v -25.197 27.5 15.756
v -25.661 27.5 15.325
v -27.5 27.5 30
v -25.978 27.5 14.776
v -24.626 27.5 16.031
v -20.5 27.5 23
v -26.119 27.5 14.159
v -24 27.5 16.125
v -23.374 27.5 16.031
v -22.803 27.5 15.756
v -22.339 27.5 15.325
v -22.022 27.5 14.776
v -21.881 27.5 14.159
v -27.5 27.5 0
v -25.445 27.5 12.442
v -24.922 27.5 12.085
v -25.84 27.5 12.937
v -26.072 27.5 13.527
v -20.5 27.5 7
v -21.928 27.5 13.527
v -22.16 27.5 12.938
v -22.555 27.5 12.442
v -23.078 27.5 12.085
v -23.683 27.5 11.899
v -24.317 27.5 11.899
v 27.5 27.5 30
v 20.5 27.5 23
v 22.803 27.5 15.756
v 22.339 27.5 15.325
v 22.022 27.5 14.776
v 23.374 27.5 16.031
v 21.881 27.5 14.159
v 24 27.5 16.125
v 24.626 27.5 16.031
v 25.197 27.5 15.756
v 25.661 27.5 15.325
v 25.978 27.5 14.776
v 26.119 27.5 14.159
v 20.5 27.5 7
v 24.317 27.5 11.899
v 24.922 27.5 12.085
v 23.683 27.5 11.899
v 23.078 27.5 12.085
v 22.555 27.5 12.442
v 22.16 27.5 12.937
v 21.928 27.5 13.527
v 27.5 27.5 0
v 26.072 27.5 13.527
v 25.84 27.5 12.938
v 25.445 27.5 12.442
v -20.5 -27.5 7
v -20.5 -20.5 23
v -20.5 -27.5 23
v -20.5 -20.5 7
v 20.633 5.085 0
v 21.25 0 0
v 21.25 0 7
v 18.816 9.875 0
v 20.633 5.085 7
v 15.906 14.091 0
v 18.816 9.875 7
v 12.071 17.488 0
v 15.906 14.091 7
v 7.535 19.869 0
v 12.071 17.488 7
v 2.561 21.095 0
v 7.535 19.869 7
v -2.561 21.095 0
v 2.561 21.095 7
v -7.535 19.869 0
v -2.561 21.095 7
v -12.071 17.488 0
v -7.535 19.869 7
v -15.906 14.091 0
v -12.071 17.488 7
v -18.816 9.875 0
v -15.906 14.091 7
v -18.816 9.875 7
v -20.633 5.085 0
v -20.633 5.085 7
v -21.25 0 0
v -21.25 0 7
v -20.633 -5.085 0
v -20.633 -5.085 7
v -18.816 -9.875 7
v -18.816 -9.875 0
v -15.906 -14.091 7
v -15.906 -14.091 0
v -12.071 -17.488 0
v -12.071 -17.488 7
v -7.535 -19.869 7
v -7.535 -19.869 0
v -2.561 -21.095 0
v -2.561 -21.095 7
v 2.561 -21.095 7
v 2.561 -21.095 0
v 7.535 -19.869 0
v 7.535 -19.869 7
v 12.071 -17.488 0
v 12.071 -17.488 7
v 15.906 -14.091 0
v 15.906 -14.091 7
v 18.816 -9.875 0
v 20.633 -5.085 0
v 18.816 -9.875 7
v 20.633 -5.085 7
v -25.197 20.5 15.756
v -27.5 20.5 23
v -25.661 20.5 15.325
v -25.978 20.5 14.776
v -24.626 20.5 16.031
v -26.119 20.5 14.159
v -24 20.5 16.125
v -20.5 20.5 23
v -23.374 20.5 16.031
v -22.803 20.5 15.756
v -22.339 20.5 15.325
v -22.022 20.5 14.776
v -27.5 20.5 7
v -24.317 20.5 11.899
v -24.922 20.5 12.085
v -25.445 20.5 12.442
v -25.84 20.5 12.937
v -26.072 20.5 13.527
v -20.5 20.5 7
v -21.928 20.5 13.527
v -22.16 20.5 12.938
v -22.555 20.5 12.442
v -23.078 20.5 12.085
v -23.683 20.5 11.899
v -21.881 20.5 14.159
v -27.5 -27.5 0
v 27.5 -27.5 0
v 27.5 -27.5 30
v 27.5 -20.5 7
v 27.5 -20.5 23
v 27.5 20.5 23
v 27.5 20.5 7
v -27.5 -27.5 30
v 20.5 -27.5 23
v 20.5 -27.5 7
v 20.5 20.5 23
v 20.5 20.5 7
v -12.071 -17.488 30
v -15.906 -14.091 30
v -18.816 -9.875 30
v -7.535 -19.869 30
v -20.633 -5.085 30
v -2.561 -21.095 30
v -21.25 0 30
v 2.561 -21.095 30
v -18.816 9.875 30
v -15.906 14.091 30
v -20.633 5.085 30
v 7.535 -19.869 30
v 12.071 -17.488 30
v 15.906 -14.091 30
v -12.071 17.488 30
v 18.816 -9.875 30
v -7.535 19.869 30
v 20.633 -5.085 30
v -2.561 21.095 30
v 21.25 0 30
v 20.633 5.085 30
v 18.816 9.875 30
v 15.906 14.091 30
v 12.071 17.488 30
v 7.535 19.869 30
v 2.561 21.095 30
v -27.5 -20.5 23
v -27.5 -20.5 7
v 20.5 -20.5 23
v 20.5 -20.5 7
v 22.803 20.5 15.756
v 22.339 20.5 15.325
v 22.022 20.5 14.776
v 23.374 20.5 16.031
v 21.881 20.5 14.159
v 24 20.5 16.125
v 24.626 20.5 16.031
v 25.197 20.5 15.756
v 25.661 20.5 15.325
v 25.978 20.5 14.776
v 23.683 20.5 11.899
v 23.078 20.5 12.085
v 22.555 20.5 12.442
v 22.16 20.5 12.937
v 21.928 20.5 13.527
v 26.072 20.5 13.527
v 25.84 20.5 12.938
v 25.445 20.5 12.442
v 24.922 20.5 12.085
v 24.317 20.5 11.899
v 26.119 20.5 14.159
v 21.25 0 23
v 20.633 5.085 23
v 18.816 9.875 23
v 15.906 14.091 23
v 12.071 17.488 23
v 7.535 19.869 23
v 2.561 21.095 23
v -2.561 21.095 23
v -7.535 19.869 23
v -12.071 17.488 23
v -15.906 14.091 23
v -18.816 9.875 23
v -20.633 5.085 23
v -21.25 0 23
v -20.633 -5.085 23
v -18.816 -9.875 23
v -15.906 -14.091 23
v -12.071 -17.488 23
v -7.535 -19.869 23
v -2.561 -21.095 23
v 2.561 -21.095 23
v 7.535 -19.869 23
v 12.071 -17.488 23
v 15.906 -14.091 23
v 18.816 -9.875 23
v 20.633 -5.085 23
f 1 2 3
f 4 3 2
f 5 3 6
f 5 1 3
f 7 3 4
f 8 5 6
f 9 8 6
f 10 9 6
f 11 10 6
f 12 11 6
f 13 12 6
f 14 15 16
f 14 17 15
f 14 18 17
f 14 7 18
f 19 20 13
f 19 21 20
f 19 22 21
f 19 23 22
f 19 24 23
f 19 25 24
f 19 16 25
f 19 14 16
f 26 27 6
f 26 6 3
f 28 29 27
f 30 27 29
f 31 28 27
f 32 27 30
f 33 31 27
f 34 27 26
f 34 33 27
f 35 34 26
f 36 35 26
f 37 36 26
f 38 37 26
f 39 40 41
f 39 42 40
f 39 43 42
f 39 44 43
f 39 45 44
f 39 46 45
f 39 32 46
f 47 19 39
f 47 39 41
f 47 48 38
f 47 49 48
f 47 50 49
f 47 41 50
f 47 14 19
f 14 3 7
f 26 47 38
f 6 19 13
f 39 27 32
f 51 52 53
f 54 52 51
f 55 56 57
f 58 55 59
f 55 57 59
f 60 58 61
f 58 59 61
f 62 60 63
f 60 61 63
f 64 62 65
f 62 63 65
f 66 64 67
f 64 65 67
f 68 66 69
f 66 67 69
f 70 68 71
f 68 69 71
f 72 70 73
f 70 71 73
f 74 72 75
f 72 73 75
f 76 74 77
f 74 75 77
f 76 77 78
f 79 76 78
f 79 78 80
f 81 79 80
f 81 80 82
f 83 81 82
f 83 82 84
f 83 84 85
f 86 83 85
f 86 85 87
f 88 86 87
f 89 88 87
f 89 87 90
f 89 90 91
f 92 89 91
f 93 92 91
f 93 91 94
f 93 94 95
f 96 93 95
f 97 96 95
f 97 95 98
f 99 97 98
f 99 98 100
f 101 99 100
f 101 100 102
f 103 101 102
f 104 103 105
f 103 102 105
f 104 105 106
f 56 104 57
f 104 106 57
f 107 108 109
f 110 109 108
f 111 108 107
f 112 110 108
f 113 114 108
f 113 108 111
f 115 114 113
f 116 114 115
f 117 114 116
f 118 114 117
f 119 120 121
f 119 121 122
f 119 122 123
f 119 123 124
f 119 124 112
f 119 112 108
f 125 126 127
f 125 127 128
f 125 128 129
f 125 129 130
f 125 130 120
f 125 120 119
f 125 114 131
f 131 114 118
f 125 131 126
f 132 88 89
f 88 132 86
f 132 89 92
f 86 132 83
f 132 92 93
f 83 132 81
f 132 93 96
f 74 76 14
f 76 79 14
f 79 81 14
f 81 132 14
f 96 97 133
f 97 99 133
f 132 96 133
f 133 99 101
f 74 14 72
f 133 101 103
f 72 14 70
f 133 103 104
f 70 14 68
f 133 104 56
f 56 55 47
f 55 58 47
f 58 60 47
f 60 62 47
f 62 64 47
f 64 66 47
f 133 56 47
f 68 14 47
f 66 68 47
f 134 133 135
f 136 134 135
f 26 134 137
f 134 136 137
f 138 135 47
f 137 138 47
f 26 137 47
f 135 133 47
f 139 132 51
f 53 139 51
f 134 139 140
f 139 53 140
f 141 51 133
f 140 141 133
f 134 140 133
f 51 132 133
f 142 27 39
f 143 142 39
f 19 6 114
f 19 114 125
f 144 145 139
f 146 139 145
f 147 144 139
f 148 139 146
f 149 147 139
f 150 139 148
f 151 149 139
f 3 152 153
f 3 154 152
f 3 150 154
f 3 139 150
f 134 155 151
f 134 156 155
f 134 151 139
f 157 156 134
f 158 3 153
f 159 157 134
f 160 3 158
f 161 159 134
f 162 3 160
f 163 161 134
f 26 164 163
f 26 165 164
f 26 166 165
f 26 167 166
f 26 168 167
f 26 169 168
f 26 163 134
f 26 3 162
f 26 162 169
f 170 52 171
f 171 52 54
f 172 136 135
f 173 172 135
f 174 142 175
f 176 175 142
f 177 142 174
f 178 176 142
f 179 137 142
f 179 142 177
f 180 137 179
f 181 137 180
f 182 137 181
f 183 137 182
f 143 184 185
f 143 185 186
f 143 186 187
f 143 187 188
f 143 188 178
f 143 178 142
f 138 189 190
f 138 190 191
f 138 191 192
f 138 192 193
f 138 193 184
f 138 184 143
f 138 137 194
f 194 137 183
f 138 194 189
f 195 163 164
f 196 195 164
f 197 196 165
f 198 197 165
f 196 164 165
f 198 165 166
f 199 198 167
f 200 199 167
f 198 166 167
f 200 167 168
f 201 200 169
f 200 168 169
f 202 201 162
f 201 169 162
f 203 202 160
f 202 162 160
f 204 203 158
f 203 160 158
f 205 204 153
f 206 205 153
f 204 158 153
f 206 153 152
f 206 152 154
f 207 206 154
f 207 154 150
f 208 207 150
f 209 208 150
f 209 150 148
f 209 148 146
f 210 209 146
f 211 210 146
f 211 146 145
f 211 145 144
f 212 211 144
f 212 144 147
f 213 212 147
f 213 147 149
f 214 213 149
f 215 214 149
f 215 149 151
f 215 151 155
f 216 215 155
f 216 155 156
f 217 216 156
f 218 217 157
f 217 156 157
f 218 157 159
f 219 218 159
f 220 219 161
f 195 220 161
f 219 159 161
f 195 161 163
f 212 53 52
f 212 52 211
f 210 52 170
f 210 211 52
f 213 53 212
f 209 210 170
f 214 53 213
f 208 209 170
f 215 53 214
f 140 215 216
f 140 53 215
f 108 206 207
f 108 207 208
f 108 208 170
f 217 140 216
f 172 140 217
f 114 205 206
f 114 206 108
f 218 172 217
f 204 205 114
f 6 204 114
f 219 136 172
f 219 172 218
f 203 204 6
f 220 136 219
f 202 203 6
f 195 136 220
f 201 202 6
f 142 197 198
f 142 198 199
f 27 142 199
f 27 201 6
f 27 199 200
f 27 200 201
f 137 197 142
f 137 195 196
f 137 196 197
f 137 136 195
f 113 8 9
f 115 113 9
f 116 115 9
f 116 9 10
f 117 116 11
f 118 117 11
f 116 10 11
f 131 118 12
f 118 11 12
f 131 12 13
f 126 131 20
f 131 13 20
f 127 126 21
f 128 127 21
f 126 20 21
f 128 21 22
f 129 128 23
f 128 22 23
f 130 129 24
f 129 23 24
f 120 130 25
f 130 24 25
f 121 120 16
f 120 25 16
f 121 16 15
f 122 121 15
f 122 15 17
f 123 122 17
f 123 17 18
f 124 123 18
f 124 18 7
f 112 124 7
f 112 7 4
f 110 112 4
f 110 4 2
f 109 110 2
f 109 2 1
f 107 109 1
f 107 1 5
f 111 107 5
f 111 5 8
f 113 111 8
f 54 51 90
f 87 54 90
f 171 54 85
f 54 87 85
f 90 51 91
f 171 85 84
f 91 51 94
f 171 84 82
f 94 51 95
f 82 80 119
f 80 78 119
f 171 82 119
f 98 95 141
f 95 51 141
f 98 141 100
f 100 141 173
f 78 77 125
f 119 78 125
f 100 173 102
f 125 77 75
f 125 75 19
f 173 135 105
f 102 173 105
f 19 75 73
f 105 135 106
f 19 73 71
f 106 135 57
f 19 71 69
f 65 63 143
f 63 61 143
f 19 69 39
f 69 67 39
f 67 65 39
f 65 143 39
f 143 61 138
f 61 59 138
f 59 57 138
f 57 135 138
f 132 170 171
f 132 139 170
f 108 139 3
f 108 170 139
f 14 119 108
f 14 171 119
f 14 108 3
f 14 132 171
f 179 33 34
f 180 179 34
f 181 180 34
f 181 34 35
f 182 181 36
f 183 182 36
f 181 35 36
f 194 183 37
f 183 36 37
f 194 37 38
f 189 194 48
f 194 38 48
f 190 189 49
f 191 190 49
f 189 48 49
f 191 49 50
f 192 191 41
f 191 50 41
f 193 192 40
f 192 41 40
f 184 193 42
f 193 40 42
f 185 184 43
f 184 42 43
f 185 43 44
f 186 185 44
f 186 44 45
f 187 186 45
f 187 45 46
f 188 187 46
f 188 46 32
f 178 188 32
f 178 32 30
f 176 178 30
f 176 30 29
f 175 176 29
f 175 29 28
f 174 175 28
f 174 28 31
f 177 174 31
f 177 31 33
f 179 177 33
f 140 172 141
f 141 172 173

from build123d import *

# Parameters (mm, degrees)
SKETCH1_W           = 55
SKETCH1_H           = 55
BOSS_EXTRUDE1_DEPTH = 30
SKETCH2_R           = 21.25
CUT_EXTRUDE1_DEPTH  = 30
SKETCH3_W           = 41
SKETCH3_H           = 16
CUT_EXTRUDE2_DEPTH  = 60
SKETCH4_W           = 16
SKETCH4_H           = 41
CUT_EXTRUDE3_DEPTH  = 60
SKETCH5_R           = 2.125
CUT_EXTRUDE4_DEPTH  = 10


with BuildPart() as part:
    # Sketch1 → Boss-Extrude1 (new body)
    with BuildSketch(Plane.XY):
        Rectangle(SKETCH1_W, SKETCH1_H)
    extrude(amount=BOSS_EXTRUDE1_DEPTH)

    # Sketch2 → Cut-Extrude1 (cut)
    with BuildSketch(Plane.XY.offset(30)):
        Circle(SKETCH2_R)
    extrude(amount=-CUT_EXTRUDE1_DEPTH, mode=Mode.SUBTRACT)

    # Sketch3 → Cut-Extrude2 (cut)
    with BuildSketch(Plane(origin=(0, 27.5, 0), x_dir=(1, 0, 0), z_dir=(0, 1, 0))):
        with Locations((0, -15)):
            Rectangle(SKETCH3_W, SKETCH3_H)
    extrude(amount=-CUT_EXTRUDE2_DEPTH, mode=Mode.SUBTRACT)

    # Sketch4 → Cut-Extrude3 (cut)
    with BuildSketch(Plane(origin=(27.5, 0, 0), x_dir=(0, 0, -1), z_dir=(1, 0, 0))):
        with Locations((-15, 0)):
            Rectangle(SKETCH4_W, SKETCH4_H)
    extrude(amount=-CUT_EXTRUDE3_DEPTH, mode=Mode.SUBTRACT)

    # Sketch5 → Cut-Extrude4 (cut)
    with BuildSketch(Plane(origin=(0, 27.5, 0), x_dir=(1, 0, 0), z_dir=(0, 1, 0))):
        with Locations(Location((-24, -14, 0), (0, 0, 270))):
            Circle(SKETCH5_R)
        with Locations(Location((24, -14, 0), (0, 0, 270))):
            Circle(SKETCH5_R)
    extrude(amount=-CUT_EXTRUDE4_DEPTH, mode=Mode.SUBTRACT)


solid = part.part
